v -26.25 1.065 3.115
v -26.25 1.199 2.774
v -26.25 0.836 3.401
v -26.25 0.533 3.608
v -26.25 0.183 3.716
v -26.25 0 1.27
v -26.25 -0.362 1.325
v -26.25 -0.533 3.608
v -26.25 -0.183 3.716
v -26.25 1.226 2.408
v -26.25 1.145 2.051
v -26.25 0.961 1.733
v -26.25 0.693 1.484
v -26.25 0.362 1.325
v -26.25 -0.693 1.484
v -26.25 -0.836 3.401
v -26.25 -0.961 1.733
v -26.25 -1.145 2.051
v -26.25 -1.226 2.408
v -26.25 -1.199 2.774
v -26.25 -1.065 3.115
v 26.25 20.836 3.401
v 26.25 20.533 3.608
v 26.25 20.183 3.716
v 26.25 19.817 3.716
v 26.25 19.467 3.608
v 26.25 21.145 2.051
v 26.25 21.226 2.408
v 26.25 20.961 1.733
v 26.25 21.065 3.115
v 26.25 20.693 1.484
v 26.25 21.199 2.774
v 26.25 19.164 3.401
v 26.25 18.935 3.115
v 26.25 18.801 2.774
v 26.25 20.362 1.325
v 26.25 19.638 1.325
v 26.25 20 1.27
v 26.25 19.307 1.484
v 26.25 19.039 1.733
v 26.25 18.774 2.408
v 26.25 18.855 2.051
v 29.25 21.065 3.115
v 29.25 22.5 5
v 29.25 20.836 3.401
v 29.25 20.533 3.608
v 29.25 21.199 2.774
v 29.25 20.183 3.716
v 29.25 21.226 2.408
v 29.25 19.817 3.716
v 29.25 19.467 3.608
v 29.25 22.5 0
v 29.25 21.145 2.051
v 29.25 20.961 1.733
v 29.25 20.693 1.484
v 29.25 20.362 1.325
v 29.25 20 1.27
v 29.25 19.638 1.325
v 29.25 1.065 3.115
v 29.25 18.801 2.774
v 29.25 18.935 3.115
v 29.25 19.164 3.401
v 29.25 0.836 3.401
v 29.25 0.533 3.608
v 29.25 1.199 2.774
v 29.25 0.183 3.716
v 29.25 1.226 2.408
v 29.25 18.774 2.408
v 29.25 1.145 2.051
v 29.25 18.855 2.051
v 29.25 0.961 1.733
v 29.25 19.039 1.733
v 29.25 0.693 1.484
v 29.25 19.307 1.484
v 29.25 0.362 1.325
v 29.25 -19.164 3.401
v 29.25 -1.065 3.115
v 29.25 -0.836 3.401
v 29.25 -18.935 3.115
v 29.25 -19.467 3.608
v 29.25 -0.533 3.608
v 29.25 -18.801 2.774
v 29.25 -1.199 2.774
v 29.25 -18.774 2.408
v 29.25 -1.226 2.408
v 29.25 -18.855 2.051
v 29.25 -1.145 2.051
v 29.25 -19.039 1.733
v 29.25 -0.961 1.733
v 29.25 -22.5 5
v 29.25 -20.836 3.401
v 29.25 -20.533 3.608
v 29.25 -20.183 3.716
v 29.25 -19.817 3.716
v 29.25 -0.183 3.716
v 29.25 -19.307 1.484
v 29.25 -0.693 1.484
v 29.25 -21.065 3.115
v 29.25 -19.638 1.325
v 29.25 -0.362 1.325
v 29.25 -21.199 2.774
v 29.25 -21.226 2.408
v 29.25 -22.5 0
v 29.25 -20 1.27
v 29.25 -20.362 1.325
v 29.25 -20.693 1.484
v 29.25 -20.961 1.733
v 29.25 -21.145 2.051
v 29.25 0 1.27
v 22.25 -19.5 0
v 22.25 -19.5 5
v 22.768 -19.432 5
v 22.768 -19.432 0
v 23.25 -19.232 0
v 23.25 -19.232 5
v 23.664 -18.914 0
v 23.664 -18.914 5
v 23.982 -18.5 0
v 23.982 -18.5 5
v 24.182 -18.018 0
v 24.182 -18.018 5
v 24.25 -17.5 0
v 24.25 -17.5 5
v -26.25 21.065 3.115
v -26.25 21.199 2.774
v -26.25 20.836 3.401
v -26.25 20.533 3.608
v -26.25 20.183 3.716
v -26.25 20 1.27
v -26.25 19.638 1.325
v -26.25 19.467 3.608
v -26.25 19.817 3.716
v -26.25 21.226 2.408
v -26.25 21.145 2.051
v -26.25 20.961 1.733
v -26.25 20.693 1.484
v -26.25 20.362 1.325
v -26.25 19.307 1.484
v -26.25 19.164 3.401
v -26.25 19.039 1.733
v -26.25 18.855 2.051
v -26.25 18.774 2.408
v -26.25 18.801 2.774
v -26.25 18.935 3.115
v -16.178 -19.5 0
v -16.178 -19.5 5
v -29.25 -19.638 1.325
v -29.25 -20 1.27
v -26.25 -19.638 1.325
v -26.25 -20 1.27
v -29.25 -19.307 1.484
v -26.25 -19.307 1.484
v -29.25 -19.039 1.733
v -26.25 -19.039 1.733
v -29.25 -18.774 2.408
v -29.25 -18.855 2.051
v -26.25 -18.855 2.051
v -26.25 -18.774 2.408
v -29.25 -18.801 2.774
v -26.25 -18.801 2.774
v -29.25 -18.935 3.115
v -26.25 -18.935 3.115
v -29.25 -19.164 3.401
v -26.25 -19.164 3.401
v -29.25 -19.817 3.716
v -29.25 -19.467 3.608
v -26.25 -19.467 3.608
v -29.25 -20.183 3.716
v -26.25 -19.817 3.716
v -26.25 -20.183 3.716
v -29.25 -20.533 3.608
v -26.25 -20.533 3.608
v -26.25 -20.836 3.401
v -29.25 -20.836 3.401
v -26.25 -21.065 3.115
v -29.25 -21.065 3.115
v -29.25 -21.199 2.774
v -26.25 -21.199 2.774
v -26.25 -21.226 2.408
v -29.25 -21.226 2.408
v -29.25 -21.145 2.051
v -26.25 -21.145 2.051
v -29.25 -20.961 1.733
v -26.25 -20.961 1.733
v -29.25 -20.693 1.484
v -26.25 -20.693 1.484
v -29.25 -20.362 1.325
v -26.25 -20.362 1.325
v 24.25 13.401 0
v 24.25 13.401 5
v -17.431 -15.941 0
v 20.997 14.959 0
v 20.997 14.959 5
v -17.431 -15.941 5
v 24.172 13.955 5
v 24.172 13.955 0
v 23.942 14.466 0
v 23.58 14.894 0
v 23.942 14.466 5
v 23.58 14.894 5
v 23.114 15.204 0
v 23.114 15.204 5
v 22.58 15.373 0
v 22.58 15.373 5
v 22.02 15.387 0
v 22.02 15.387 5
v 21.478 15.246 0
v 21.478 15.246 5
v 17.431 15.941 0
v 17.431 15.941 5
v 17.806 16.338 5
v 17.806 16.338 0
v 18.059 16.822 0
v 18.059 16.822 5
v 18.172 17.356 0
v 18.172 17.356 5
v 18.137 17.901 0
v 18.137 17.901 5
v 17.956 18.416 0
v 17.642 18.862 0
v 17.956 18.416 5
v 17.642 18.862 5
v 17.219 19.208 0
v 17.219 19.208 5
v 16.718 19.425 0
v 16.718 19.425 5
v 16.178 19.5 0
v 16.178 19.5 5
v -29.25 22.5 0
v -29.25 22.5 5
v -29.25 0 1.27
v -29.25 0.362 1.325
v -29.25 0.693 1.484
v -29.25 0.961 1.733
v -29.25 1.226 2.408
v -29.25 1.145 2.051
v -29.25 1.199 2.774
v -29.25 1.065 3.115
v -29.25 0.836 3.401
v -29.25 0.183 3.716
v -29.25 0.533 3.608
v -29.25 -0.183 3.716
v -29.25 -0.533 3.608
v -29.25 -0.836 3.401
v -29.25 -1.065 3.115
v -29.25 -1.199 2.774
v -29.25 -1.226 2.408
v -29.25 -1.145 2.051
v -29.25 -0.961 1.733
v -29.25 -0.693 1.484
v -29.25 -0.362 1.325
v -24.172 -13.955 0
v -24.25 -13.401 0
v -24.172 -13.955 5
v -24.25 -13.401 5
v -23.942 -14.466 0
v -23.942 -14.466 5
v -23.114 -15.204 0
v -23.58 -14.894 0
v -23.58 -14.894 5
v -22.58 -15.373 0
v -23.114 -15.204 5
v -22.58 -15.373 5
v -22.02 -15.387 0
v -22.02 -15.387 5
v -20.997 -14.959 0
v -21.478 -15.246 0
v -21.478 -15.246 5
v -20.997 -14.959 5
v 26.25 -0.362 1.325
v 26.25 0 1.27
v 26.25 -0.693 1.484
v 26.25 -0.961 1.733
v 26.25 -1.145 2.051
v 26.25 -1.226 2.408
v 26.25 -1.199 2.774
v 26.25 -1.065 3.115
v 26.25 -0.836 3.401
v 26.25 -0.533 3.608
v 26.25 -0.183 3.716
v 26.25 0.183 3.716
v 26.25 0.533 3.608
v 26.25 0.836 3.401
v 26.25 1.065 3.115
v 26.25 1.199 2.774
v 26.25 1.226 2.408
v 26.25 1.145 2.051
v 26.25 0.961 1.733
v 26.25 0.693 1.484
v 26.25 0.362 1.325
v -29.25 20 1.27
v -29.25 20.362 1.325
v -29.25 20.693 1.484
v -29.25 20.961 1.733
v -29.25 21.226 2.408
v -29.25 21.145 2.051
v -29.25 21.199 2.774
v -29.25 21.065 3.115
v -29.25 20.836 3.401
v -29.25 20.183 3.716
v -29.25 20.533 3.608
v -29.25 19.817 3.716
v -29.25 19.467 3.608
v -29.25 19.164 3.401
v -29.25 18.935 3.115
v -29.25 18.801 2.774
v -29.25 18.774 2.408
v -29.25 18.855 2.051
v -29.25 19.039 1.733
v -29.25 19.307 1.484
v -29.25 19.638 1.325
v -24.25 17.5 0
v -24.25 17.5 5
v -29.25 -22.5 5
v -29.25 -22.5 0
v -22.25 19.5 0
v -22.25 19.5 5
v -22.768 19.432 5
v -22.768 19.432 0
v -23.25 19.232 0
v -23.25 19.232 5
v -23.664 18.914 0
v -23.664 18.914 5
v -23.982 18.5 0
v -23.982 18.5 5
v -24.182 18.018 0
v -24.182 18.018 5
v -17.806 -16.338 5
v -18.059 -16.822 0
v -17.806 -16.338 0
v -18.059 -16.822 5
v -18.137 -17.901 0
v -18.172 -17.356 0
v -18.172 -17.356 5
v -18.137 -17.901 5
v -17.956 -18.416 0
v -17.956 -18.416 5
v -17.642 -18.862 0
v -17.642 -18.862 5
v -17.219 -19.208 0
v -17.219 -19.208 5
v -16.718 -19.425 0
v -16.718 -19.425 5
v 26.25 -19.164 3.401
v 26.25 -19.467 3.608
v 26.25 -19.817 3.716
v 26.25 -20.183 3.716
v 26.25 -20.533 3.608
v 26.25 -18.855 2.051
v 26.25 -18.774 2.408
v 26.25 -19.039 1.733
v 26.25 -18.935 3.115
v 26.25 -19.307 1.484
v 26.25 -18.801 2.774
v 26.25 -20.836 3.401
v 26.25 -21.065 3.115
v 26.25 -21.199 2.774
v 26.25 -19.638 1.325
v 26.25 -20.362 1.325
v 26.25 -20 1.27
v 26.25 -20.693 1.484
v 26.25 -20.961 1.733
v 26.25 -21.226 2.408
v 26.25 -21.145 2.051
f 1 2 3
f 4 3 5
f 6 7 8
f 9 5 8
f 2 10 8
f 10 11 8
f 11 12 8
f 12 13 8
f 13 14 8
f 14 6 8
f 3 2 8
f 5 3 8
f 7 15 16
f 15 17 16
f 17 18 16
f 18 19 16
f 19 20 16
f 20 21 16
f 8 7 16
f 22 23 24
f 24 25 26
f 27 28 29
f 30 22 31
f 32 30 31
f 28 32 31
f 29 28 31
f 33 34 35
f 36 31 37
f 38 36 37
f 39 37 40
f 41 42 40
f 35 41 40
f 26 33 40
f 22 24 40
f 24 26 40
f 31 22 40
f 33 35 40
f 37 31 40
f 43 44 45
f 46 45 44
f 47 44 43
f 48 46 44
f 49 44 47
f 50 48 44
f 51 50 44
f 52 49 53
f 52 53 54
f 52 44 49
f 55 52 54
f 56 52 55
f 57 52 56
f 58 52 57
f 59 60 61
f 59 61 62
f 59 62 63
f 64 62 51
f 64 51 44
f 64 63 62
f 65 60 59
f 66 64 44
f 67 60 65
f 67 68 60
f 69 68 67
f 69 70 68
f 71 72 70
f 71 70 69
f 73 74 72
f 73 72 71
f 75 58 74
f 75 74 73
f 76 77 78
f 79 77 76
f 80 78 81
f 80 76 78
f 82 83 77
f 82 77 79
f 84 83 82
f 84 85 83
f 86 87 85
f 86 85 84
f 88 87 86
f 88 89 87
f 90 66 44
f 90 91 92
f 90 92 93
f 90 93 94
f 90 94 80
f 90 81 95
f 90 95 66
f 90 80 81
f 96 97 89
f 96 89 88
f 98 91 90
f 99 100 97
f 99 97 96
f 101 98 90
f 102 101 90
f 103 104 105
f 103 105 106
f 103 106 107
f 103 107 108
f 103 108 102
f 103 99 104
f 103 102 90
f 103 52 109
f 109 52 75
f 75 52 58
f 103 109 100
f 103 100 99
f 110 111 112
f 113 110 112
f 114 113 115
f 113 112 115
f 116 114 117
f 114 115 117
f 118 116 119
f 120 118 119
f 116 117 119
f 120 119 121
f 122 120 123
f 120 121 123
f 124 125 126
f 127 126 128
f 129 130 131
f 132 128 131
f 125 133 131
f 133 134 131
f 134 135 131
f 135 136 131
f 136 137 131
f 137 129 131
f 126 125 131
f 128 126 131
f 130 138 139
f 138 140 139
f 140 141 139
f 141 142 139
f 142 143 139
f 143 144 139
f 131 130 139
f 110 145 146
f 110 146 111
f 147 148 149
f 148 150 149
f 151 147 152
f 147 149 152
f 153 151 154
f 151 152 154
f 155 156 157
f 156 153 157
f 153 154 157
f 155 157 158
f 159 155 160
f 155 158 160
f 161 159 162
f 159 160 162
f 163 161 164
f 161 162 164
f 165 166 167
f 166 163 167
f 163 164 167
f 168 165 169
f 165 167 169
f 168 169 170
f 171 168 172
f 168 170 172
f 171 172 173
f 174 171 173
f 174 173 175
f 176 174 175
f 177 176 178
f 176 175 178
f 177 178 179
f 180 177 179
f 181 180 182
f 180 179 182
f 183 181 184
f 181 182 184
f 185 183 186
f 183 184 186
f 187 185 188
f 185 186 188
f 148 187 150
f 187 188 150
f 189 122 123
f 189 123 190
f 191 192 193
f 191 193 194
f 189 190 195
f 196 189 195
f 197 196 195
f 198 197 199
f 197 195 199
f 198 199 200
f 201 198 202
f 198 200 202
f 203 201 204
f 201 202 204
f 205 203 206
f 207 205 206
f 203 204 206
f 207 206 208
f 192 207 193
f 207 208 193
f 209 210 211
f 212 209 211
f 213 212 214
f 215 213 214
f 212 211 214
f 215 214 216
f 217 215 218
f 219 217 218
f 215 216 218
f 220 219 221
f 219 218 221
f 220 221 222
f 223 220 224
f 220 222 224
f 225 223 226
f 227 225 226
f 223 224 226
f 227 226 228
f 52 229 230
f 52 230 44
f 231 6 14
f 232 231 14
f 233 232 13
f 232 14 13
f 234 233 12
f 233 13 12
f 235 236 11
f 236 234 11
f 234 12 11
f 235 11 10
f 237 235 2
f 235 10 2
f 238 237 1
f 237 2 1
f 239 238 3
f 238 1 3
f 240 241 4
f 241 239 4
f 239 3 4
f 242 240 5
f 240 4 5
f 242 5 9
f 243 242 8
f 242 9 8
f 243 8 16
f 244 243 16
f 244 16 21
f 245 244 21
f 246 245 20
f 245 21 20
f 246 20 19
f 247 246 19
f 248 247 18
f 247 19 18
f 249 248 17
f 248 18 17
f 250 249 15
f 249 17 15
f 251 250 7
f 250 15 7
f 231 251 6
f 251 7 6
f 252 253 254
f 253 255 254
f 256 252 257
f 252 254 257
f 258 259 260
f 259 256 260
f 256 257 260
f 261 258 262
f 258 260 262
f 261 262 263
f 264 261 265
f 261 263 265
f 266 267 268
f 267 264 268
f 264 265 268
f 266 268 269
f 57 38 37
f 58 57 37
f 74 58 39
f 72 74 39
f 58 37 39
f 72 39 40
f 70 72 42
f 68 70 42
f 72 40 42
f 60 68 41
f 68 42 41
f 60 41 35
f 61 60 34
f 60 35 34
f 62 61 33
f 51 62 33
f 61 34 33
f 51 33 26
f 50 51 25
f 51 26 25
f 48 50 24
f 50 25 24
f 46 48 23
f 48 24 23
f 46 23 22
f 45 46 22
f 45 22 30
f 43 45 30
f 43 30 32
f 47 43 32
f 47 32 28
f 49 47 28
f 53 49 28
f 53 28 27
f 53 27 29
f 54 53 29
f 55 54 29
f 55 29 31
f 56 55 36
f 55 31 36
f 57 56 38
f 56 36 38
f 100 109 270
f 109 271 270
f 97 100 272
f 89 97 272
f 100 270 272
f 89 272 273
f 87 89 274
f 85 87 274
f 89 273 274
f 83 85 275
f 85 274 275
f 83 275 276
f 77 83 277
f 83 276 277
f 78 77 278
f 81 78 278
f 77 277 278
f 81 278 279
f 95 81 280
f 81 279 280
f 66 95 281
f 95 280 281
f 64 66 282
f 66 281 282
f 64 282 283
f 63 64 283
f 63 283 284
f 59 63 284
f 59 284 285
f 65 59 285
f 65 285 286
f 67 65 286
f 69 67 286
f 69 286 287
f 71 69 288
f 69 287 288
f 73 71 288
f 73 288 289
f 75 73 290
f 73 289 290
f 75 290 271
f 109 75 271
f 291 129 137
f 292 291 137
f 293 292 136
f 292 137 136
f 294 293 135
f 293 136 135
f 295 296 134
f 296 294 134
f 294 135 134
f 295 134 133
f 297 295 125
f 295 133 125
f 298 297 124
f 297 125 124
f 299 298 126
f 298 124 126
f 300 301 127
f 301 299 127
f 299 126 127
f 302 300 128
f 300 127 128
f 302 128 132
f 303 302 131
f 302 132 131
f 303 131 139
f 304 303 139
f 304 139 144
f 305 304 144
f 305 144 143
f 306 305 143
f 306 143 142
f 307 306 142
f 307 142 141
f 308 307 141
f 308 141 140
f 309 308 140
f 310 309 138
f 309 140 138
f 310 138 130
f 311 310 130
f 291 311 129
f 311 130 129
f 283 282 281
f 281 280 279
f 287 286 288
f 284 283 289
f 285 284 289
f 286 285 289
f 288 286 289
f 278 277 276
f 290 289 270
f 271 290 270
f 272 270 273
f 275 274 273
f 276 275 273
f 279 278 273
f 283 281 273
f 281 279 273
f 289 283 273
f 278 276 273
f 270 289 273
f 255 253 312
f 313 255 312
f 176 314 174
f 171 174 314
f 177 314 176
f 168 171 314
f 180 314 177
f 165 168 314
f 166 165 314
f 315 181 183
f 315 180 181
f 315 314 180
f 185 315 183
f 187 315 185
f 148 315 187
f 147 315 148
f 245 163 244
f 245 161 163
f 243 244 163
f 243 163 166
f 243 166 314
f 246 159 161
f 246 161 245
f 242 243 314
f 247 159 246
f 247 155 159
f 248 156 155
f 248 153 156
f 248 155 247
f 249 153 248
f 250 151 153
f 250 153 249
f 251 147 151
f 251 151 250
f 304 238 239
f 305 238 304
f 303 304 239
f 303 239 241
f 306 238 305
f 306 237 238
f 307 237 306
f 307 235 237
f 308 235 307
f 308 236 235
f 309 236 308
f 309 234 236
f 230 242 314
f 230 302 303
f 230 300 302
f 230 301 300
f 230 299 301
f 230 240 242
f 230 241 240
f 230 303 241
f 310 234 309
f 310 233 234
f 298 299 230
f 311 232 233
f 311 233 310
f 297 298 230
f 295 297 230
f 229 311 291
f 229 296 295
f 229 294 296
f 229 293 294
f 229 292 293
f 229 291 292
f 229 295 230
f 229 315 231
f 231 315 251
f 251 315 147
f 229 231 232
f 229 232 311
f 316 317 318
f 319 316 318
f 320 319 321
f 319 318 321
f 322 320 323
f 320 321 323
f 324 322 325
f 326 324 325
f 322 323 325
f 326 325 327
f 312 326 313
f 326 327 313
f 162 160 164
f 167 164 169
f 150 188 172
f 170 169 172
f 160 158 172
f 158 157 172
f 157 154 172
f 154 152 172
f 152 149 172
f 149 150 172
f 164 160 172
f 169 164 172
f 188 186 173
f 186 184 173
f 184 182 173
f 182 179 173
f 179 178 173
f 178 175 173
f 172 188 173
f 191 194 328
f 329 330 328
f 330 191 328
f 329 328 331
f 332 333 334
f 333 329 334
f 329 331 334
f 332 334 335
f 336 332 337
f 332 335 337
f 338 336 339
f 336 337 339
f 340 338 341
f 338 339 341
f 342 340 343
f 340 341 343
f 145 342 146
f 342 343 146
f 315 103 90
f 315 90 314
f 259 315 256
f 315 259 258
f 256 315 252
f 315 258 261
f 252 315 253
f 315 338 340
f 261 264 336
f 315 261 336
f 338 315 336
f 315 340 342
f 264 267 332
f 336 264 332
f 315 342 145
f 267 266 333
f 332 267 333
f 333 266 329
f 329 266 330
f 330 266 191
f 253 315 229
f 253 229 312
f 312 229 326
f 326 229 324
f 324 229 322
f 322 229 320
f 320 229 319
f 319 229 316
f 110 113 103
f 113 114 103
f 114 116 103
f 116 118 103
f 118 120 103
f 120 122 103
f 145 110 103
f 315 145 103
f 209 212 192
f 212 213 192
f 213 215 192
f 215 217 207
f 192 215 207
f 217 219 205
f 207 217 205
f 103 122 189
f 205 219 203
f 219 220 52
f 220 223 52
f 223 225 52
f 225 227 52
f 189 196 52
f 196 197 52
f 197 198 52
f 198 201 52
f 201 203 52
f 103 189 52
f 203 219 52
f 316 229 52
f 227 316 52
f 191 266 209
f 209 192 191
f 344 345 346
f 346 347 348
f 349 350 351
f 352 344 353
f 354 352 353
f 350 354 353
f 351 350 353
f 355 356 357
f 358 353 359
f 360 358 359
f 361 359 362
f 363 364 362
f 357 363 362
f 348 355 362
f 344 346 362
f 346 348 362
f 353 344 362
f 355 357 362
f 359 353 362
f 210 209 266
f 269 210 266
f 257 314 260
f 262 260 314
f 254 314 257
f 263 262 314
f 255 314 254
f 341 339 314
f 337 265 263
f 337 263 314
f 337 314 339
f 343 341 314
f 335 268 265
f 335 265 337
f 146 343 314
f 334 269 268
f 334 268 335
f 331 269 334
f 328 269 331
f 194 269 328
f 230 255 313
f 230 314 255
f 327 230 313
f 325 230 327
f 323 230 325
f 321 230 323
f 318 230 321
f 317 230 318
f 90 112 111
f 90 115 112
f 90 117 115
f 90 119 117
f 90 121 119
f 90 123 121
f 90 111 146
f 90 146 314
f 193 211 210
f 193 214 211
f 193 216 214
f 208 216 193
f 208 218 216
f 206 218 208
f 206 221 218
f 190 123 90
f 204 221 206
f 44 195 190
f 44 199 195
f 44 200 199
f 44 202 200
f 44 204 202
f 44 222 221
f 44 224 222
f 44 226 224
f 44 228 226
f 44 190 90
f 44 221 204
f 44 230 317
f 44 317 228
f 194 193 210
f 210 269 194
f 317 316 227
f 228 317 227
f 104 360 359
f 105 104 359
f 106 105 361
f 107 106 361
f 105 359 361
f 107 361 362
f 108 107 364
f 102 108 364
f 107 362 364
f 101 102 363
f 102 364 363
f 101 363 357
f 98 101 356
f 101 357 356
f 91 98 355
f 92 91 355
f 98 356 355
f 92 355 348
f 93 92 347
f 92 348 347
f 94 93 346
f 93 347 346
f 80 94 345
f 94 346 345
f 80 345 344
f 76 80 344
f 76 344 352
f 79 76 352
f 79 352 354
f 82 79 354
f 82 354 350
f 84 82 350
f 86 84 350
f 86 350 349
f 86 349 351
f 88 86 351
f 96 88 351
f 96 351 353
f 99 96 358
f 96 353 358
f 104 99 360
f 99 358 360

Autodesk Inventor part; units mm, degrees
ref_plane "YZ Plane" through (0, 0, 0) normal (1, 0, 0) x (0, 1, 0)
ref_plane "XZ Plane" through (0, 0, 0) normal (0, 1, 0) x (-1, 0, 0)
ref_plane "XY Plane" through (0, 0, 0) normal (0, 0, 1) x (1, 0, 0)
sketch "スケッチ1" plane through (0, 0, 0) normal (0, 0, 1) x (1, 0, 0)
  line L0 (-29.25, 22.5) -> (29.25, 22.5)
  line L1 (29.25, 22.5) -> (29.25, -22.5)
  line L2 (29.25, -22.5) -> (-29.25, -22.5)
  line L3 (-29.25, -22.5) -> (-29.25, 22.5)
  line L4 (-24.25, 19.5) -> (24.25, 19.5) construction
  line L5 (24.25, 19.5) -> (24.25, -19.5) construction
  line L6 (24.25, -19.5) -> (-24.25, -19.5) construction
  line L7 (-24.25, -19.5) -> (-24.25, 19.5) construction
  line L8 (24.25, 19.5) -> (-24.25, -19.5) construction
  line L9 (-24.25, -17.5752) -> (-24.25, 19.5)
  line L10 (-24.25, 19.5) -> (21.8563, 19.5)
  line L11 (21.8563, 19.5) -> (-24.25, -17.5752)
  line L12 (-21.8563, -19.5) -> (24.25, -19.5)
  line L13 (24.25, -19.5) -> (24.25, 17.5752)
  line L14 (24.25, 17.5752) -> (-21.8563, -19.5)
  line L15 (-29.25, 20) -> (29.25, 20) construction
  line L16 (29.25, -20) -> (-29.25, -20) construction
  line L17 (29.25, 20) -> (29.25, -20) construction
  point P0 (0, 0)
  point P1 (0, 19.5)
  point P2 (0, 22.5)
  point P3 (24.25, 0)
  point P4 (29.25, 0)
  dimension "d0" = 5
  dimension "d1" = 3
  dimension "d2" = 1.5
  dimension "d3" = 40
  dimension "d4" = 2.5
  dimension "d19" = 58.5
extrude "押し出し1" add sketch "スケッチ1" along normal blind 5
sketch "スケッチ2" plane through (29.25, -22.5, 0) normal (1, 0, 0) x (0, 0, -1)
  line L0 (0, 45) -> (-5, 45) projected
  line L1 (-5, 0) -> (-5, 45) projected
  line L2 (0, 22.5) -> (-5, 22.5) construction
  point P0 (-2.5, 2.5)
  point P1 (-2.5, 22.5)
  point P2 (-2.5, 42.5)
  point P3 (-2.5, 45)
  dimension "d7" = 40
hole "穴1" at (29.25, -20, 2.5) at (29.25, 0, 2.5) at (29.25, 20, 2.5) direction (-1, 0, 0) diameter 2.459 depth 3 thread size "M3x0.5" class "6H" standard "ISO Metric profile"
mirror "ミラー1" about plane through (0, 0, 0) normal (1, 0, 0) of "穴1"
fillet "フィレット1" radius 2 6 edges at (-21.8563, -19.5, 2.5) (-24.25, -17.5752, 2.5) (24.25, 17.5752, 2.5) (24.25, -19.5, 2.5) (-24.25, 19.5, 2.5) (21.8563, 19.5, 2.5)
equation "\"d3\" = d11_1"
equation "\"d7\" = d3"
equation "\"d11_1\" = 40"
properties part number "リンク_ふくらはぎ_サブフレーム_1_1(予備案)" material "アルミニウム 2014-T4"
